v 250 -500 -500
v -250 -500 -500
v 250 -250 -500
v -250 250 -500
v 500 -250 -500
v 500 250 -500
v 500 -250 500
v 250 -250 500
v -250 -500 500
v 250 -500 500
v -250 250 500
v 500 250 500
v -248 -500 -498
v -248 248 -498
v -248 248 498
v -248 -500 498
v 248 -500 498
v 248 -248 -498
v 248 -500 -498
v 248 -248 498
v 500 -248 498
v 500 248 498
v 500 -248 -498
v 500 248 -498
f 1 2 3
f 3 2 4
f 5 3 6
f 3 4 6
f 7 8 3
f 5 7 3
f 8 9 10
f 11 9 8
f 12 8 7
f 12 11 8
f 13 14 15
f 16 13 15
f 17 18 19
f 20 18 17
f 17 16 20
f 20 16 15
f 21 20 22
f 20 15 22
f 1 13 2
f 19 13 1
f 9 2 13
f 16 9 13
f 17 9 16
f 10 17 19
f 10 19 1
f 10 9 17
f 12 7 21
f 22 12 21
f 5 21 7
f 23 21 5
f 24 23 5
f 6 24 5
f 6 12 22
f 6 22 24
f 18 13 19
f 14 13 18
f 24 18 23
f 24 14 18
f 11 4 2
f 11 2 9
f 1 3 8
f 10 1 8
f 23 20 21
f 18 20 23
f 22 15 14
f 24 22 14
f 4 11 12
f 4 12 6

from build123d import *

# Parameters (mm, degrees)
EXTRUDE_THIN1_START       = -250
EXTRUDE_THIN1_OUTLINE_W   = 1000
EXTRUDE_THIN1_OUTLINE_H   = 500
EXTRUDE_THIN1_OUTLINE_W_2 = 996
EXTRUDE_THIN1_OUTLINE_H_2 = 496
EXTRUDE_THIN1_DEPTH       = 750
EXTRUDE_THIN2_START       = -498
SKETCH2_W                 = 500
SKETCH2_H                 = 1000
SKETCH2_W_2               = 496
SKETCH2_H_2               = 996
EXTRUDE_THIN2_DEPTH       = 748
CUT_EXTRUDE1_REACH        = 1032.776
SKETCH3_W                 = 496
SKETCH3_H                 = 996
CUT_EXTRUDE2_REACH        = 1032.776
SKETCH4_W                 = 996
SKETCH4_H                 = 496


# Read off the part's stored shape, not the designer's step: Extrude-Thin1
with BuildPart() as part:
    # Extrude-Thin1 outline → Extrude-Thin1 (new body)
    with BuildSketch(Plane(origin=(0, 0, 0), x_dir=(0, 0, -1), z_dir=(1, 0, 0)).offset(EXTRUDE_THIN1_START)):
        Rectangle(EXTRUDE_THIN1_OUTLINE_W, EXTRUDE_THIN1_OUTLINE_H)
        Rectangle(EXTRUDE_THIN1_OUTLINE_W_2, EXTRUDE_THIN1_OUTLINE_H_2, mode=Mode.SUBTRACT)
    extrude(amount=EXTRUDE_THIN1_DEPTH)

    # Sketch2 → Extrude-Thin2 (add)
    with BuildSketch(Plane.XZ.offset(250).offset(EXTRUDE_THIN2_START)):
        Rectangle(SKETCH2_W, SKETCH2_H)
        Rectangle(SKETCH2_W_2, SKETCH2_H_2, mode=Mode.SUBTRACT)
    extrude(amount=EXTRUDE_THIN2_DEPTH)

    # Sketch3 → Cut-Extrude1 (cut, up to next)
    with BuildSketch(Plane.XZ.offset(500), mode=Mode.PRIVATE) as cut_extrude1_sk1:
        Rectangle(SKETCH3_W, SKETCH3_H)
    cut_extrude1_tool1 = extrude(cut_extrude1_sk1.sketch, amount=-CUT_EXTRUDE1_REACH, mode=Mode.PRIVATE) & part.part
    add(cut_extrude1_tool1.solids().sort_by_distance((0, -500, 0))[0], mode=Mode.SUBTRACT)

    # Sketch4 → Cut-Extrude2 (cut, up to next)
    with BuildSketch(Plane(origin=(500, 0, 0), x_dir=(0, 0, -1), z_dir=(1, 0, 0)), mode=Mode.PRIVATE) as cut_extrude2_sk1:
        Rectangle(SKETCH4_W, SKETCH4_H)
    cut_extrude2_tool1 = extrude(cut_extrude2_sk1.sketch, amount=-CUT_EXTRUDE2_REACH, mode=Mode.PRIVATE) & part.part
    add(cut_extrude2_tool1.solids().sort_by_distance((500, 0, 0))[0], mode=Mode.SUBTRACT)


solid = part.part
